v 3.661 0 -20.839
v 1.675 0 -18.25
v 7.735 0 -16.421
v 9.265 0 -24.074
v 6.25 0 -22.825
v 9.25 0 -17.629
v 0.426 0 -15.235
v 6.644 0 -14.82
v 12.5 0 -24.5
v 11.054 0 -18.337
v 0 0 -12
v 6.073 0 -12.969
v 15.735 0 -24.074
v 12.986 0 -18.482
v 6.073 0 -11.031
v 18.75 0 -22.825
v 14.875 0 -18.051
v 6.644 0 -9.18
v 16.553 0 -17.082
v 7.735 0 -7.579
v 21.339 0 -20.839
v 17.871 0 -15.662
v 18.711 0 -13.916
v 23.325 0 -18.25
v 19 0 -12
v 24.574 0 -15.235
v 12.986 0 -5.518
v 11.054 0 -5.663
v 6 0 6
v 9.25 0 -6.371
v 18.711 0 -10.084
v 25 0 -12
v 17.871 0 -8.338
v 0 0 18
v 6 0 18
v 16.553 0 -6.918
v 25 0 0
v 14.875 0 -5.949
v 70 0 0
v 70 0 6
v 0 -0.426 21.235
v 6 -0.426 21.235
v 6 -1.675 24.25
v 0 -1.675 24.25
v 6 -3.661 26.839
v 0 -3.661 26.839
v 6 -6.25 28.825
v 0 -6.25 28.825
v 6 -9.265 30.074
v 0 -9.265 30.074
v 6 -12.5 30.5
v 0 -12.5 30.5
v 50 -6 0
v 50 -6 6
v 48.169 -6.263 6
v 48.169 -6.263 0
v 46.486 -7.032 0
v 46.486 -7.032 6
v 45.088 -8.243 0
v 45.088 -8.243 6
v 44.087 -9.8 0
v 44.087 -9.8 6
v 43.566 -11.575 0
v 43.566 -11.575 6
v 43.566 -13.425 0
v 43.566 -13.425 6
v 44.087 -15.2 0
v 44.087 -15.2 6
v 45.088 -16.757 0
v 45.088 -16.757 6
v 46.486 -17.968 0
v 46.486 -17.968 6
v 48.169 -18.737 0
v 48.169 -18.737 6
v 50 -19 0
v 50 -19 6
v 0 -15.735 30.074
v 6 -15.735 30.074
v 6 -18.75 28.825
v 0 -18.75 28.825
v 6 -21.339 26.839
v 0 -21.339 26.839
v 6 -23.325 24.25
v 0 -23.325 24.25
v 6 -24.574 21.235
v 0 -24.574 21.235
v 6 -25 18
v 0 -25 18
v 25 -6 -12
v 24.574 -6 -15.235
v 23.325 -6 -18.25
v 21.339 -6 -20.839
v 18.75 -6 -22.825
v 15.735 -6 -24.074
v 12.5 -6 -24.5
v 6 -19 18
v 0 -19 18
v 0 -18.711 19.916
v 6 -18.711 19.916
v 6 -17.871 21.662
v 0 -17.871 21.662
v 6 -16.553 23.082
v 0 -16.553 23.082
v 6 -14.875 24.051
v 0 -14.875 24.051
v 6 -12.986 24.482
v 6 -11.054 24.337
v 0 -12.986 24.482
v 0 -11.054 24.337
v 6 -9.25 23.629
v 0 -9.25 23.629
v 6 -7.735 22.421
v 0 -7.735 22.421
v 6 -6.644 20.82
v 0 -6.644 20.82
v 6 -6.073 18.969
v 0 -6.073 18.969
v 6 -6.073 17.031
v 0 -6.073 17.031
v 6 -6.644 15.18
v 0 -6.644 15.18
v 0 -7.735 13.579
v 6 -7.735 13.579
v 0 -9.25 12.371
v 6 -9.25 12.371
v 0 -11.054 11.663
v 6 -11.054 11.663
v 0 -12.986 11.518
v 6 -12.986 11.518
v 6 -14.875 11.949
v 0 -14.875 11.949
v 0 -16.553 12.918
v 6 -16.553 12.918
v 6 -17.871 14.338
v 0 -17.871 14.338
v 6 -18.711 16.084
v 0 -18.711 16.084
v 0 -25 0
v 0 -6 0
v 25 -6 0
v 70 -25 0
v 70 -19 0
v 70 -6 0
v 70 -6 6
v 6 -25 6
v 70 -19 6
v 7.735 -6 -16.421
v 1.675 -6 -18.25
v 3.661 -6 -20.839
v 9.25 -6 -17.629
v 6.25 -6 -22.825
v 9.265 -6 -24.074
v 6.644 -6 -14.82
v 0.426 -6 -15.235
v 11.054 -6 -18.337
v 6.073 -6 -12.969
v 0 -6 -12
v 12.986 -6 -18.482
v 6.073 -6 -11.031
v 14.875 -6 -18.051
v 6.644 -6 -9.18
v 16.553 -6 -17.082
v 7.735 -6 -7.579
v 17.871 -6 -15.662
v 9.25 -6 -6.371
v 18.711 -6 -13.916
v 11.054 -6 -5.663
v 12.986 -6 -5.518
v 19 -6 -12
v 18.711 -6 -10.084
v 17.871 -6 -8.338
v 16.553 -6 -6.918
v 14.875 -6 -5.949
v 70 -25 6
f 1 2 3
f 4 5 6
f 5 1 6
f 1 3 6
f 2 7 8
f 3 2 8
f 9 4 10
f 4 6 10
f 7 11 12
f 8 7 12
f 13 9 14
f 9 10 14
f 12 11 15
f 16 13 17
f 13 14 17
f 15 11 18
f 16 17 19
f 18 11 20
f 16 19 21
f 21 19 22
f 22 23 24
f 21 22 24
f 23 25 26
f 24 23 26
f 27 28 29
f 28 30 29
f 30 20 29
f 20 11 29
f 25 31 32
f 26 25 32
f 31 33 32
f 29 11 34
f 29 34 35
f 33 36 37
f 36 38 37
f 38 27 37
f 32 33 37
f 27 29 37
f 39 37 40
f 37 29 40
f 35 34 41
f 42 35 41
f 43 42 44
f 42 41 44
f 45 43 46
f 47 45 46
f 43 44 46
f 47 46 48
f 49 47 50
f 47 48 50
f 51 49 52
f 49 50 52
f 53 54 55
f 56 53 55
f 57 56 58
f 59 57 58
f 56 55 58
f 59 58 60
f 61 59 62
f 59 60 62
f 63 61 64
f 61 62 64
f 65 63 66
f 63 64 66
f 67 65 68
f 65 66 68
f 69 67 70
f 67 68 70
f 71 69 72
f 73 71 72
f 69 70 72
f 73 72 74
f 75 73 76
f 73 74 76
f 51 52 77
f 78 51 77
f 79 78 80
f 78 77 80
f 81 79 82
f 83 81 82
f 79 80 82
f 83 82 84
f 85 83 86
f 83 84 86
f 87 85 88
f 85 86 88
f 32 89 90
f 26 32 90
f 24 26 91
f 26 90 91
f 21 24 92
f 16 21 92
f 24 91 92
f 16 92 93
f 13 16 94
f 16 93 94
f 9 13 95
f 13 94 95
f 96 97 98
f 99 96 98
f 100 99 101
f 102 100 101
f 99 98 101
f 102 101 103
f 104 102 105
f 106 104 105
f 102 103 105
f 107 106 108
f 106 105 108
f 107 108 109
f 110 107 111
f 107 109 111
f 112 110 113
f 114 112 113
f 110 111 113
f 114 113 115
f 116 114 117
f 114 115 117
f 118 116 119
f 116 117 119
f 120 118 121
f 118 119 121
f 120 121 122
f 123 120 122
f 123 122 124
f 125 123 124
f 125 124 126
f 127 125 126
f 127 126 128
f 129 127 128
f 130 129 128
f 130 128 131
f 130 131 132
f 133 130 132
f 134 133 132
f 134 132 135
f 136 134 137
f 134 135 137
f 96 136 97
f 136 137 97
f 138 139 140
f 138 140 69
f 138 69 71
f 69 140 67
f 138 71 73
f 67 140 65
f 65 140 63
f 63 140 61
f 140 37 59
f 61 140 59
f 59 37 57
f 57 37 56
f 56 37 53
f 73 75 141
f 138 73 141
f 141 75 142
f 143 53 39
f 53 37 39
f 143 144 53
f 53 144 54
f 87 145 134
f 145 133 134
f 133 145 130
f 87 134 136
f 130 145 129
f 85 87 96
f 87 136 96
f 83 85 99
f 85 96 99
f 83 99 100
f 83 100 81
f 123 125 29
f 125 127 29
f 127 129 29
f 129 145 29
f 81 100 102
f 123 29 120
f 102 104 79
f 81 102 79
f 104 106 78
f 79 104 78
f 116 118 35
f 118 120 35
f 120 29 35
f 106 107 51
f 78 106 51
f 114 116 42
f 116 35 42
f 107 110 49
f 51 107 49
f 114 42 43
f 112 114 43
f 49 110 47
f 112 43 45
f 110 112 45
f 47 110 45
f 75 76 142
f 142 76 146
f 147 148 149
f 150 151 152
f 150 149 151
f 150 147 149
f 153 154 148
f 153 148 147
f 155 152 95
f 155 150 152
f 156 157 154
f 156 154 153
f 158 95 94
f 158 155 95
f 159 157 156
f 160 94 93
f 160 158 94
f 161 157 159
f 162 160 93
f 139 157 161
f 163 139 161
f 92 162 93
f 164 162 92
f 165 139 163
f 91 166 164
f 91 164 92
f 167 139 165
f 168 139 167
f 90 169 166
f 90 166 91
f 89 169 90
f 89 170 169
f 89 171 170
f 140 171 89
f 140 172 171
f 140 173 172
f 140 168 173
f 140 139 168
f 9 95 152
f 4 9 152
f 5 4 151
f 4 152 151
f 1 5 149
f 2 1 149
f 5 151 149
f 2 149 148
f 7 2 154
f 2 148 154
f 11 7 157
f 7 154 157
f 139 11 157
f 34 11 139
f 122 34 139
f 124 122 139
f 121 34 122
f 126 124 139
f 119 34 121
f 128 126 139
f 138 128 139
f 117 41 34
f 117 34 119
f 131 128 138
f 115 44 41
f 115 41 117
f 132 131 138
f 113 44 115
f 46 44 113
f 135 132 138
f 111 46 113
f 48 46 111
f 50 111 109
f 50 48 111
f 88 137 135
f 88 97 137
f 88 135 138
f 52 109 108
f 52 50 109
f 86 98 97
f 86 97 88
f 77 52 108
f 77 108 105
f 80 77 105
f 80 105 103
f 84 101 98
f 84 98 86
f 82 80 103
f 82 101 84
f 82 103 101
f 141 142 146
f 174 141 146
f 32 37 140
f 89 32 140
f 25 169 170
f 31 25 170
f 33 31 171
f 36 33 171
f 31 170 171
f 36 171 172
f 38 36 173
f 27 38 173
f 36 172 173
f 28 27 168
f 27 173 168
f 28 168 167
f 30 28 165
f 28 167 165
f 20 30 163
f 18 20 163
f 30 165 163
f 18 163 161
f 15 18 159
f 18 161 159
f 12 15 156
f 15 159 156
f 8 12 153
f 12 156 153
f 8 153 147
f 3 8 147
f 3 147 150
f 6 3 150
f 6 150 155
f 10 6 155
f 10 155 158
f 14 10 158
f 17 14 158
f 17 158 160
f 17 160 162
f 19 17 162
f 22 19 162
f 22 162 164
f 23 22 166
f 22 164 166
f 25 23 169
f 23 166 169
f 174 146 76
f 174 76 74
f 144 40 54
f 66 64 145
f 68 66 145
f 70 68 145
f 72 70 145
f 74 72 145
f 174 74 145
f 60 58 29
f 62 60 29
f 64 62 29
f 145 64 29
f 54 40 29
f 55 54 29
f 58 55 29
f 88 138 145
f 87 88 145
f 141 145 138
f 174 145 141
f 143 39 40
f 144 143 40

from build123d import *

# Parameters (mm, degrees)
F1_DEPTH  = 25
F3_DEPTH  = 6
F5_DEPTH  = 6
F6_R      = 6.5
F7_DEPTH  = 6
F8_W      = 25
F8_H      = 6
F9_DEPTH  = 24.5
F10_R     = 6.5
F11_DEPTH = 6


with BuildPart() as f1:
    # F0 (on Front) → F1 (new body)
    with BuildSketch(Plane.XZ):
        Polygon((0, 30.5), (0, 0), (70, 0), (70, 6), (6, 6), (6, 30.5), align=None)
    extrude(amount=F1_DEPTH)

    # F2 (on face) → F3 (cut)
    with BuildSketch(Plane.XY.offset(6)):
        with BuildLine():
            Line((70, -19), (70, -6))
            Line((70, -6), (50, -6))
            ThreePointArc((50, -6), (43.5, -12.5), (50, -19))
            Line((50, -19), (70, -19))
        make_face()
    extrude(amount=-F3_DEPTH, mode=Mode.SUBTRACT)

    # F4 (on face) → F5 (cut)
    with BuildSketch(Plane(origin=(0, 0, 0), x_dir=(0, -1, 0), z_dir=(-1, 0, 0))):
        with BuildLine():
            ThreePointArc((12.5, 30.5), (21.338835, 26.838835), (25, 18))
            Line((25, 18), (25, 30.5))
            Line((25, 30.5), (12.5, 30.5))
        make_face()
        with BuildLine():
            ThreePointArc((0, 18), (3.661165, 26.838835), (12.5, 30.5))
            Line((12.5, 30.5), (0, 30.5))
            Line((0, 30.5), (0, 18))
        make_face()
    extrude(amount=-F5_DEPTH, mode=Mode.SUBTRACT)

    # F6 (on face) → F7 (cut)
    with BuildSketch(Plane(origin=(0, 0, 0), x_dir=(0, -1, 0), z_dir=(-1, 0, 0))):
        with Locations((12.5, 18)):
            Circle(F6_R)
    extrude(amount=-F7_DEPTH, mode=Mode.SUBTRACT)

    # F8 (on face) → F9 (join)
    with BuildSketch(Plane(origin=(0, 0, 0), x_dir=(1, 0, 0), z_dir=(0, 0, -1))):
        with Locations((12.5, 3)):
            Rectangle(F8_W, F8_H)
    extrude(amount=F9_DEPTH)

    # F10 (on face) → F11 (cut)
    with BuildSketch(Plane.XZ.offset(6)):
        with BuildLine():
            ThreePointArc((12.5, -24.5), (3.661165, -20.838835), (0, -12))
            Line((0, -12), (0, -24.5))
            Line((0, -24.5), (12.5, -24.5))
        make_face()
        with BuildLine():
            ThreePointArc((25, -12), (21.338835, -20.838835), (12.5, -24.5))
            Line((12.5, -24.5), (25, -24.5))
            Line((25, -24.5), (25, -12))
        make_face()
        with Locations((12.5, -12)):
            Circle(F10_R)
    extrude(amount=-F11_DEPTH, mode=Mode.SUBTRACT)


solid = f1.part
